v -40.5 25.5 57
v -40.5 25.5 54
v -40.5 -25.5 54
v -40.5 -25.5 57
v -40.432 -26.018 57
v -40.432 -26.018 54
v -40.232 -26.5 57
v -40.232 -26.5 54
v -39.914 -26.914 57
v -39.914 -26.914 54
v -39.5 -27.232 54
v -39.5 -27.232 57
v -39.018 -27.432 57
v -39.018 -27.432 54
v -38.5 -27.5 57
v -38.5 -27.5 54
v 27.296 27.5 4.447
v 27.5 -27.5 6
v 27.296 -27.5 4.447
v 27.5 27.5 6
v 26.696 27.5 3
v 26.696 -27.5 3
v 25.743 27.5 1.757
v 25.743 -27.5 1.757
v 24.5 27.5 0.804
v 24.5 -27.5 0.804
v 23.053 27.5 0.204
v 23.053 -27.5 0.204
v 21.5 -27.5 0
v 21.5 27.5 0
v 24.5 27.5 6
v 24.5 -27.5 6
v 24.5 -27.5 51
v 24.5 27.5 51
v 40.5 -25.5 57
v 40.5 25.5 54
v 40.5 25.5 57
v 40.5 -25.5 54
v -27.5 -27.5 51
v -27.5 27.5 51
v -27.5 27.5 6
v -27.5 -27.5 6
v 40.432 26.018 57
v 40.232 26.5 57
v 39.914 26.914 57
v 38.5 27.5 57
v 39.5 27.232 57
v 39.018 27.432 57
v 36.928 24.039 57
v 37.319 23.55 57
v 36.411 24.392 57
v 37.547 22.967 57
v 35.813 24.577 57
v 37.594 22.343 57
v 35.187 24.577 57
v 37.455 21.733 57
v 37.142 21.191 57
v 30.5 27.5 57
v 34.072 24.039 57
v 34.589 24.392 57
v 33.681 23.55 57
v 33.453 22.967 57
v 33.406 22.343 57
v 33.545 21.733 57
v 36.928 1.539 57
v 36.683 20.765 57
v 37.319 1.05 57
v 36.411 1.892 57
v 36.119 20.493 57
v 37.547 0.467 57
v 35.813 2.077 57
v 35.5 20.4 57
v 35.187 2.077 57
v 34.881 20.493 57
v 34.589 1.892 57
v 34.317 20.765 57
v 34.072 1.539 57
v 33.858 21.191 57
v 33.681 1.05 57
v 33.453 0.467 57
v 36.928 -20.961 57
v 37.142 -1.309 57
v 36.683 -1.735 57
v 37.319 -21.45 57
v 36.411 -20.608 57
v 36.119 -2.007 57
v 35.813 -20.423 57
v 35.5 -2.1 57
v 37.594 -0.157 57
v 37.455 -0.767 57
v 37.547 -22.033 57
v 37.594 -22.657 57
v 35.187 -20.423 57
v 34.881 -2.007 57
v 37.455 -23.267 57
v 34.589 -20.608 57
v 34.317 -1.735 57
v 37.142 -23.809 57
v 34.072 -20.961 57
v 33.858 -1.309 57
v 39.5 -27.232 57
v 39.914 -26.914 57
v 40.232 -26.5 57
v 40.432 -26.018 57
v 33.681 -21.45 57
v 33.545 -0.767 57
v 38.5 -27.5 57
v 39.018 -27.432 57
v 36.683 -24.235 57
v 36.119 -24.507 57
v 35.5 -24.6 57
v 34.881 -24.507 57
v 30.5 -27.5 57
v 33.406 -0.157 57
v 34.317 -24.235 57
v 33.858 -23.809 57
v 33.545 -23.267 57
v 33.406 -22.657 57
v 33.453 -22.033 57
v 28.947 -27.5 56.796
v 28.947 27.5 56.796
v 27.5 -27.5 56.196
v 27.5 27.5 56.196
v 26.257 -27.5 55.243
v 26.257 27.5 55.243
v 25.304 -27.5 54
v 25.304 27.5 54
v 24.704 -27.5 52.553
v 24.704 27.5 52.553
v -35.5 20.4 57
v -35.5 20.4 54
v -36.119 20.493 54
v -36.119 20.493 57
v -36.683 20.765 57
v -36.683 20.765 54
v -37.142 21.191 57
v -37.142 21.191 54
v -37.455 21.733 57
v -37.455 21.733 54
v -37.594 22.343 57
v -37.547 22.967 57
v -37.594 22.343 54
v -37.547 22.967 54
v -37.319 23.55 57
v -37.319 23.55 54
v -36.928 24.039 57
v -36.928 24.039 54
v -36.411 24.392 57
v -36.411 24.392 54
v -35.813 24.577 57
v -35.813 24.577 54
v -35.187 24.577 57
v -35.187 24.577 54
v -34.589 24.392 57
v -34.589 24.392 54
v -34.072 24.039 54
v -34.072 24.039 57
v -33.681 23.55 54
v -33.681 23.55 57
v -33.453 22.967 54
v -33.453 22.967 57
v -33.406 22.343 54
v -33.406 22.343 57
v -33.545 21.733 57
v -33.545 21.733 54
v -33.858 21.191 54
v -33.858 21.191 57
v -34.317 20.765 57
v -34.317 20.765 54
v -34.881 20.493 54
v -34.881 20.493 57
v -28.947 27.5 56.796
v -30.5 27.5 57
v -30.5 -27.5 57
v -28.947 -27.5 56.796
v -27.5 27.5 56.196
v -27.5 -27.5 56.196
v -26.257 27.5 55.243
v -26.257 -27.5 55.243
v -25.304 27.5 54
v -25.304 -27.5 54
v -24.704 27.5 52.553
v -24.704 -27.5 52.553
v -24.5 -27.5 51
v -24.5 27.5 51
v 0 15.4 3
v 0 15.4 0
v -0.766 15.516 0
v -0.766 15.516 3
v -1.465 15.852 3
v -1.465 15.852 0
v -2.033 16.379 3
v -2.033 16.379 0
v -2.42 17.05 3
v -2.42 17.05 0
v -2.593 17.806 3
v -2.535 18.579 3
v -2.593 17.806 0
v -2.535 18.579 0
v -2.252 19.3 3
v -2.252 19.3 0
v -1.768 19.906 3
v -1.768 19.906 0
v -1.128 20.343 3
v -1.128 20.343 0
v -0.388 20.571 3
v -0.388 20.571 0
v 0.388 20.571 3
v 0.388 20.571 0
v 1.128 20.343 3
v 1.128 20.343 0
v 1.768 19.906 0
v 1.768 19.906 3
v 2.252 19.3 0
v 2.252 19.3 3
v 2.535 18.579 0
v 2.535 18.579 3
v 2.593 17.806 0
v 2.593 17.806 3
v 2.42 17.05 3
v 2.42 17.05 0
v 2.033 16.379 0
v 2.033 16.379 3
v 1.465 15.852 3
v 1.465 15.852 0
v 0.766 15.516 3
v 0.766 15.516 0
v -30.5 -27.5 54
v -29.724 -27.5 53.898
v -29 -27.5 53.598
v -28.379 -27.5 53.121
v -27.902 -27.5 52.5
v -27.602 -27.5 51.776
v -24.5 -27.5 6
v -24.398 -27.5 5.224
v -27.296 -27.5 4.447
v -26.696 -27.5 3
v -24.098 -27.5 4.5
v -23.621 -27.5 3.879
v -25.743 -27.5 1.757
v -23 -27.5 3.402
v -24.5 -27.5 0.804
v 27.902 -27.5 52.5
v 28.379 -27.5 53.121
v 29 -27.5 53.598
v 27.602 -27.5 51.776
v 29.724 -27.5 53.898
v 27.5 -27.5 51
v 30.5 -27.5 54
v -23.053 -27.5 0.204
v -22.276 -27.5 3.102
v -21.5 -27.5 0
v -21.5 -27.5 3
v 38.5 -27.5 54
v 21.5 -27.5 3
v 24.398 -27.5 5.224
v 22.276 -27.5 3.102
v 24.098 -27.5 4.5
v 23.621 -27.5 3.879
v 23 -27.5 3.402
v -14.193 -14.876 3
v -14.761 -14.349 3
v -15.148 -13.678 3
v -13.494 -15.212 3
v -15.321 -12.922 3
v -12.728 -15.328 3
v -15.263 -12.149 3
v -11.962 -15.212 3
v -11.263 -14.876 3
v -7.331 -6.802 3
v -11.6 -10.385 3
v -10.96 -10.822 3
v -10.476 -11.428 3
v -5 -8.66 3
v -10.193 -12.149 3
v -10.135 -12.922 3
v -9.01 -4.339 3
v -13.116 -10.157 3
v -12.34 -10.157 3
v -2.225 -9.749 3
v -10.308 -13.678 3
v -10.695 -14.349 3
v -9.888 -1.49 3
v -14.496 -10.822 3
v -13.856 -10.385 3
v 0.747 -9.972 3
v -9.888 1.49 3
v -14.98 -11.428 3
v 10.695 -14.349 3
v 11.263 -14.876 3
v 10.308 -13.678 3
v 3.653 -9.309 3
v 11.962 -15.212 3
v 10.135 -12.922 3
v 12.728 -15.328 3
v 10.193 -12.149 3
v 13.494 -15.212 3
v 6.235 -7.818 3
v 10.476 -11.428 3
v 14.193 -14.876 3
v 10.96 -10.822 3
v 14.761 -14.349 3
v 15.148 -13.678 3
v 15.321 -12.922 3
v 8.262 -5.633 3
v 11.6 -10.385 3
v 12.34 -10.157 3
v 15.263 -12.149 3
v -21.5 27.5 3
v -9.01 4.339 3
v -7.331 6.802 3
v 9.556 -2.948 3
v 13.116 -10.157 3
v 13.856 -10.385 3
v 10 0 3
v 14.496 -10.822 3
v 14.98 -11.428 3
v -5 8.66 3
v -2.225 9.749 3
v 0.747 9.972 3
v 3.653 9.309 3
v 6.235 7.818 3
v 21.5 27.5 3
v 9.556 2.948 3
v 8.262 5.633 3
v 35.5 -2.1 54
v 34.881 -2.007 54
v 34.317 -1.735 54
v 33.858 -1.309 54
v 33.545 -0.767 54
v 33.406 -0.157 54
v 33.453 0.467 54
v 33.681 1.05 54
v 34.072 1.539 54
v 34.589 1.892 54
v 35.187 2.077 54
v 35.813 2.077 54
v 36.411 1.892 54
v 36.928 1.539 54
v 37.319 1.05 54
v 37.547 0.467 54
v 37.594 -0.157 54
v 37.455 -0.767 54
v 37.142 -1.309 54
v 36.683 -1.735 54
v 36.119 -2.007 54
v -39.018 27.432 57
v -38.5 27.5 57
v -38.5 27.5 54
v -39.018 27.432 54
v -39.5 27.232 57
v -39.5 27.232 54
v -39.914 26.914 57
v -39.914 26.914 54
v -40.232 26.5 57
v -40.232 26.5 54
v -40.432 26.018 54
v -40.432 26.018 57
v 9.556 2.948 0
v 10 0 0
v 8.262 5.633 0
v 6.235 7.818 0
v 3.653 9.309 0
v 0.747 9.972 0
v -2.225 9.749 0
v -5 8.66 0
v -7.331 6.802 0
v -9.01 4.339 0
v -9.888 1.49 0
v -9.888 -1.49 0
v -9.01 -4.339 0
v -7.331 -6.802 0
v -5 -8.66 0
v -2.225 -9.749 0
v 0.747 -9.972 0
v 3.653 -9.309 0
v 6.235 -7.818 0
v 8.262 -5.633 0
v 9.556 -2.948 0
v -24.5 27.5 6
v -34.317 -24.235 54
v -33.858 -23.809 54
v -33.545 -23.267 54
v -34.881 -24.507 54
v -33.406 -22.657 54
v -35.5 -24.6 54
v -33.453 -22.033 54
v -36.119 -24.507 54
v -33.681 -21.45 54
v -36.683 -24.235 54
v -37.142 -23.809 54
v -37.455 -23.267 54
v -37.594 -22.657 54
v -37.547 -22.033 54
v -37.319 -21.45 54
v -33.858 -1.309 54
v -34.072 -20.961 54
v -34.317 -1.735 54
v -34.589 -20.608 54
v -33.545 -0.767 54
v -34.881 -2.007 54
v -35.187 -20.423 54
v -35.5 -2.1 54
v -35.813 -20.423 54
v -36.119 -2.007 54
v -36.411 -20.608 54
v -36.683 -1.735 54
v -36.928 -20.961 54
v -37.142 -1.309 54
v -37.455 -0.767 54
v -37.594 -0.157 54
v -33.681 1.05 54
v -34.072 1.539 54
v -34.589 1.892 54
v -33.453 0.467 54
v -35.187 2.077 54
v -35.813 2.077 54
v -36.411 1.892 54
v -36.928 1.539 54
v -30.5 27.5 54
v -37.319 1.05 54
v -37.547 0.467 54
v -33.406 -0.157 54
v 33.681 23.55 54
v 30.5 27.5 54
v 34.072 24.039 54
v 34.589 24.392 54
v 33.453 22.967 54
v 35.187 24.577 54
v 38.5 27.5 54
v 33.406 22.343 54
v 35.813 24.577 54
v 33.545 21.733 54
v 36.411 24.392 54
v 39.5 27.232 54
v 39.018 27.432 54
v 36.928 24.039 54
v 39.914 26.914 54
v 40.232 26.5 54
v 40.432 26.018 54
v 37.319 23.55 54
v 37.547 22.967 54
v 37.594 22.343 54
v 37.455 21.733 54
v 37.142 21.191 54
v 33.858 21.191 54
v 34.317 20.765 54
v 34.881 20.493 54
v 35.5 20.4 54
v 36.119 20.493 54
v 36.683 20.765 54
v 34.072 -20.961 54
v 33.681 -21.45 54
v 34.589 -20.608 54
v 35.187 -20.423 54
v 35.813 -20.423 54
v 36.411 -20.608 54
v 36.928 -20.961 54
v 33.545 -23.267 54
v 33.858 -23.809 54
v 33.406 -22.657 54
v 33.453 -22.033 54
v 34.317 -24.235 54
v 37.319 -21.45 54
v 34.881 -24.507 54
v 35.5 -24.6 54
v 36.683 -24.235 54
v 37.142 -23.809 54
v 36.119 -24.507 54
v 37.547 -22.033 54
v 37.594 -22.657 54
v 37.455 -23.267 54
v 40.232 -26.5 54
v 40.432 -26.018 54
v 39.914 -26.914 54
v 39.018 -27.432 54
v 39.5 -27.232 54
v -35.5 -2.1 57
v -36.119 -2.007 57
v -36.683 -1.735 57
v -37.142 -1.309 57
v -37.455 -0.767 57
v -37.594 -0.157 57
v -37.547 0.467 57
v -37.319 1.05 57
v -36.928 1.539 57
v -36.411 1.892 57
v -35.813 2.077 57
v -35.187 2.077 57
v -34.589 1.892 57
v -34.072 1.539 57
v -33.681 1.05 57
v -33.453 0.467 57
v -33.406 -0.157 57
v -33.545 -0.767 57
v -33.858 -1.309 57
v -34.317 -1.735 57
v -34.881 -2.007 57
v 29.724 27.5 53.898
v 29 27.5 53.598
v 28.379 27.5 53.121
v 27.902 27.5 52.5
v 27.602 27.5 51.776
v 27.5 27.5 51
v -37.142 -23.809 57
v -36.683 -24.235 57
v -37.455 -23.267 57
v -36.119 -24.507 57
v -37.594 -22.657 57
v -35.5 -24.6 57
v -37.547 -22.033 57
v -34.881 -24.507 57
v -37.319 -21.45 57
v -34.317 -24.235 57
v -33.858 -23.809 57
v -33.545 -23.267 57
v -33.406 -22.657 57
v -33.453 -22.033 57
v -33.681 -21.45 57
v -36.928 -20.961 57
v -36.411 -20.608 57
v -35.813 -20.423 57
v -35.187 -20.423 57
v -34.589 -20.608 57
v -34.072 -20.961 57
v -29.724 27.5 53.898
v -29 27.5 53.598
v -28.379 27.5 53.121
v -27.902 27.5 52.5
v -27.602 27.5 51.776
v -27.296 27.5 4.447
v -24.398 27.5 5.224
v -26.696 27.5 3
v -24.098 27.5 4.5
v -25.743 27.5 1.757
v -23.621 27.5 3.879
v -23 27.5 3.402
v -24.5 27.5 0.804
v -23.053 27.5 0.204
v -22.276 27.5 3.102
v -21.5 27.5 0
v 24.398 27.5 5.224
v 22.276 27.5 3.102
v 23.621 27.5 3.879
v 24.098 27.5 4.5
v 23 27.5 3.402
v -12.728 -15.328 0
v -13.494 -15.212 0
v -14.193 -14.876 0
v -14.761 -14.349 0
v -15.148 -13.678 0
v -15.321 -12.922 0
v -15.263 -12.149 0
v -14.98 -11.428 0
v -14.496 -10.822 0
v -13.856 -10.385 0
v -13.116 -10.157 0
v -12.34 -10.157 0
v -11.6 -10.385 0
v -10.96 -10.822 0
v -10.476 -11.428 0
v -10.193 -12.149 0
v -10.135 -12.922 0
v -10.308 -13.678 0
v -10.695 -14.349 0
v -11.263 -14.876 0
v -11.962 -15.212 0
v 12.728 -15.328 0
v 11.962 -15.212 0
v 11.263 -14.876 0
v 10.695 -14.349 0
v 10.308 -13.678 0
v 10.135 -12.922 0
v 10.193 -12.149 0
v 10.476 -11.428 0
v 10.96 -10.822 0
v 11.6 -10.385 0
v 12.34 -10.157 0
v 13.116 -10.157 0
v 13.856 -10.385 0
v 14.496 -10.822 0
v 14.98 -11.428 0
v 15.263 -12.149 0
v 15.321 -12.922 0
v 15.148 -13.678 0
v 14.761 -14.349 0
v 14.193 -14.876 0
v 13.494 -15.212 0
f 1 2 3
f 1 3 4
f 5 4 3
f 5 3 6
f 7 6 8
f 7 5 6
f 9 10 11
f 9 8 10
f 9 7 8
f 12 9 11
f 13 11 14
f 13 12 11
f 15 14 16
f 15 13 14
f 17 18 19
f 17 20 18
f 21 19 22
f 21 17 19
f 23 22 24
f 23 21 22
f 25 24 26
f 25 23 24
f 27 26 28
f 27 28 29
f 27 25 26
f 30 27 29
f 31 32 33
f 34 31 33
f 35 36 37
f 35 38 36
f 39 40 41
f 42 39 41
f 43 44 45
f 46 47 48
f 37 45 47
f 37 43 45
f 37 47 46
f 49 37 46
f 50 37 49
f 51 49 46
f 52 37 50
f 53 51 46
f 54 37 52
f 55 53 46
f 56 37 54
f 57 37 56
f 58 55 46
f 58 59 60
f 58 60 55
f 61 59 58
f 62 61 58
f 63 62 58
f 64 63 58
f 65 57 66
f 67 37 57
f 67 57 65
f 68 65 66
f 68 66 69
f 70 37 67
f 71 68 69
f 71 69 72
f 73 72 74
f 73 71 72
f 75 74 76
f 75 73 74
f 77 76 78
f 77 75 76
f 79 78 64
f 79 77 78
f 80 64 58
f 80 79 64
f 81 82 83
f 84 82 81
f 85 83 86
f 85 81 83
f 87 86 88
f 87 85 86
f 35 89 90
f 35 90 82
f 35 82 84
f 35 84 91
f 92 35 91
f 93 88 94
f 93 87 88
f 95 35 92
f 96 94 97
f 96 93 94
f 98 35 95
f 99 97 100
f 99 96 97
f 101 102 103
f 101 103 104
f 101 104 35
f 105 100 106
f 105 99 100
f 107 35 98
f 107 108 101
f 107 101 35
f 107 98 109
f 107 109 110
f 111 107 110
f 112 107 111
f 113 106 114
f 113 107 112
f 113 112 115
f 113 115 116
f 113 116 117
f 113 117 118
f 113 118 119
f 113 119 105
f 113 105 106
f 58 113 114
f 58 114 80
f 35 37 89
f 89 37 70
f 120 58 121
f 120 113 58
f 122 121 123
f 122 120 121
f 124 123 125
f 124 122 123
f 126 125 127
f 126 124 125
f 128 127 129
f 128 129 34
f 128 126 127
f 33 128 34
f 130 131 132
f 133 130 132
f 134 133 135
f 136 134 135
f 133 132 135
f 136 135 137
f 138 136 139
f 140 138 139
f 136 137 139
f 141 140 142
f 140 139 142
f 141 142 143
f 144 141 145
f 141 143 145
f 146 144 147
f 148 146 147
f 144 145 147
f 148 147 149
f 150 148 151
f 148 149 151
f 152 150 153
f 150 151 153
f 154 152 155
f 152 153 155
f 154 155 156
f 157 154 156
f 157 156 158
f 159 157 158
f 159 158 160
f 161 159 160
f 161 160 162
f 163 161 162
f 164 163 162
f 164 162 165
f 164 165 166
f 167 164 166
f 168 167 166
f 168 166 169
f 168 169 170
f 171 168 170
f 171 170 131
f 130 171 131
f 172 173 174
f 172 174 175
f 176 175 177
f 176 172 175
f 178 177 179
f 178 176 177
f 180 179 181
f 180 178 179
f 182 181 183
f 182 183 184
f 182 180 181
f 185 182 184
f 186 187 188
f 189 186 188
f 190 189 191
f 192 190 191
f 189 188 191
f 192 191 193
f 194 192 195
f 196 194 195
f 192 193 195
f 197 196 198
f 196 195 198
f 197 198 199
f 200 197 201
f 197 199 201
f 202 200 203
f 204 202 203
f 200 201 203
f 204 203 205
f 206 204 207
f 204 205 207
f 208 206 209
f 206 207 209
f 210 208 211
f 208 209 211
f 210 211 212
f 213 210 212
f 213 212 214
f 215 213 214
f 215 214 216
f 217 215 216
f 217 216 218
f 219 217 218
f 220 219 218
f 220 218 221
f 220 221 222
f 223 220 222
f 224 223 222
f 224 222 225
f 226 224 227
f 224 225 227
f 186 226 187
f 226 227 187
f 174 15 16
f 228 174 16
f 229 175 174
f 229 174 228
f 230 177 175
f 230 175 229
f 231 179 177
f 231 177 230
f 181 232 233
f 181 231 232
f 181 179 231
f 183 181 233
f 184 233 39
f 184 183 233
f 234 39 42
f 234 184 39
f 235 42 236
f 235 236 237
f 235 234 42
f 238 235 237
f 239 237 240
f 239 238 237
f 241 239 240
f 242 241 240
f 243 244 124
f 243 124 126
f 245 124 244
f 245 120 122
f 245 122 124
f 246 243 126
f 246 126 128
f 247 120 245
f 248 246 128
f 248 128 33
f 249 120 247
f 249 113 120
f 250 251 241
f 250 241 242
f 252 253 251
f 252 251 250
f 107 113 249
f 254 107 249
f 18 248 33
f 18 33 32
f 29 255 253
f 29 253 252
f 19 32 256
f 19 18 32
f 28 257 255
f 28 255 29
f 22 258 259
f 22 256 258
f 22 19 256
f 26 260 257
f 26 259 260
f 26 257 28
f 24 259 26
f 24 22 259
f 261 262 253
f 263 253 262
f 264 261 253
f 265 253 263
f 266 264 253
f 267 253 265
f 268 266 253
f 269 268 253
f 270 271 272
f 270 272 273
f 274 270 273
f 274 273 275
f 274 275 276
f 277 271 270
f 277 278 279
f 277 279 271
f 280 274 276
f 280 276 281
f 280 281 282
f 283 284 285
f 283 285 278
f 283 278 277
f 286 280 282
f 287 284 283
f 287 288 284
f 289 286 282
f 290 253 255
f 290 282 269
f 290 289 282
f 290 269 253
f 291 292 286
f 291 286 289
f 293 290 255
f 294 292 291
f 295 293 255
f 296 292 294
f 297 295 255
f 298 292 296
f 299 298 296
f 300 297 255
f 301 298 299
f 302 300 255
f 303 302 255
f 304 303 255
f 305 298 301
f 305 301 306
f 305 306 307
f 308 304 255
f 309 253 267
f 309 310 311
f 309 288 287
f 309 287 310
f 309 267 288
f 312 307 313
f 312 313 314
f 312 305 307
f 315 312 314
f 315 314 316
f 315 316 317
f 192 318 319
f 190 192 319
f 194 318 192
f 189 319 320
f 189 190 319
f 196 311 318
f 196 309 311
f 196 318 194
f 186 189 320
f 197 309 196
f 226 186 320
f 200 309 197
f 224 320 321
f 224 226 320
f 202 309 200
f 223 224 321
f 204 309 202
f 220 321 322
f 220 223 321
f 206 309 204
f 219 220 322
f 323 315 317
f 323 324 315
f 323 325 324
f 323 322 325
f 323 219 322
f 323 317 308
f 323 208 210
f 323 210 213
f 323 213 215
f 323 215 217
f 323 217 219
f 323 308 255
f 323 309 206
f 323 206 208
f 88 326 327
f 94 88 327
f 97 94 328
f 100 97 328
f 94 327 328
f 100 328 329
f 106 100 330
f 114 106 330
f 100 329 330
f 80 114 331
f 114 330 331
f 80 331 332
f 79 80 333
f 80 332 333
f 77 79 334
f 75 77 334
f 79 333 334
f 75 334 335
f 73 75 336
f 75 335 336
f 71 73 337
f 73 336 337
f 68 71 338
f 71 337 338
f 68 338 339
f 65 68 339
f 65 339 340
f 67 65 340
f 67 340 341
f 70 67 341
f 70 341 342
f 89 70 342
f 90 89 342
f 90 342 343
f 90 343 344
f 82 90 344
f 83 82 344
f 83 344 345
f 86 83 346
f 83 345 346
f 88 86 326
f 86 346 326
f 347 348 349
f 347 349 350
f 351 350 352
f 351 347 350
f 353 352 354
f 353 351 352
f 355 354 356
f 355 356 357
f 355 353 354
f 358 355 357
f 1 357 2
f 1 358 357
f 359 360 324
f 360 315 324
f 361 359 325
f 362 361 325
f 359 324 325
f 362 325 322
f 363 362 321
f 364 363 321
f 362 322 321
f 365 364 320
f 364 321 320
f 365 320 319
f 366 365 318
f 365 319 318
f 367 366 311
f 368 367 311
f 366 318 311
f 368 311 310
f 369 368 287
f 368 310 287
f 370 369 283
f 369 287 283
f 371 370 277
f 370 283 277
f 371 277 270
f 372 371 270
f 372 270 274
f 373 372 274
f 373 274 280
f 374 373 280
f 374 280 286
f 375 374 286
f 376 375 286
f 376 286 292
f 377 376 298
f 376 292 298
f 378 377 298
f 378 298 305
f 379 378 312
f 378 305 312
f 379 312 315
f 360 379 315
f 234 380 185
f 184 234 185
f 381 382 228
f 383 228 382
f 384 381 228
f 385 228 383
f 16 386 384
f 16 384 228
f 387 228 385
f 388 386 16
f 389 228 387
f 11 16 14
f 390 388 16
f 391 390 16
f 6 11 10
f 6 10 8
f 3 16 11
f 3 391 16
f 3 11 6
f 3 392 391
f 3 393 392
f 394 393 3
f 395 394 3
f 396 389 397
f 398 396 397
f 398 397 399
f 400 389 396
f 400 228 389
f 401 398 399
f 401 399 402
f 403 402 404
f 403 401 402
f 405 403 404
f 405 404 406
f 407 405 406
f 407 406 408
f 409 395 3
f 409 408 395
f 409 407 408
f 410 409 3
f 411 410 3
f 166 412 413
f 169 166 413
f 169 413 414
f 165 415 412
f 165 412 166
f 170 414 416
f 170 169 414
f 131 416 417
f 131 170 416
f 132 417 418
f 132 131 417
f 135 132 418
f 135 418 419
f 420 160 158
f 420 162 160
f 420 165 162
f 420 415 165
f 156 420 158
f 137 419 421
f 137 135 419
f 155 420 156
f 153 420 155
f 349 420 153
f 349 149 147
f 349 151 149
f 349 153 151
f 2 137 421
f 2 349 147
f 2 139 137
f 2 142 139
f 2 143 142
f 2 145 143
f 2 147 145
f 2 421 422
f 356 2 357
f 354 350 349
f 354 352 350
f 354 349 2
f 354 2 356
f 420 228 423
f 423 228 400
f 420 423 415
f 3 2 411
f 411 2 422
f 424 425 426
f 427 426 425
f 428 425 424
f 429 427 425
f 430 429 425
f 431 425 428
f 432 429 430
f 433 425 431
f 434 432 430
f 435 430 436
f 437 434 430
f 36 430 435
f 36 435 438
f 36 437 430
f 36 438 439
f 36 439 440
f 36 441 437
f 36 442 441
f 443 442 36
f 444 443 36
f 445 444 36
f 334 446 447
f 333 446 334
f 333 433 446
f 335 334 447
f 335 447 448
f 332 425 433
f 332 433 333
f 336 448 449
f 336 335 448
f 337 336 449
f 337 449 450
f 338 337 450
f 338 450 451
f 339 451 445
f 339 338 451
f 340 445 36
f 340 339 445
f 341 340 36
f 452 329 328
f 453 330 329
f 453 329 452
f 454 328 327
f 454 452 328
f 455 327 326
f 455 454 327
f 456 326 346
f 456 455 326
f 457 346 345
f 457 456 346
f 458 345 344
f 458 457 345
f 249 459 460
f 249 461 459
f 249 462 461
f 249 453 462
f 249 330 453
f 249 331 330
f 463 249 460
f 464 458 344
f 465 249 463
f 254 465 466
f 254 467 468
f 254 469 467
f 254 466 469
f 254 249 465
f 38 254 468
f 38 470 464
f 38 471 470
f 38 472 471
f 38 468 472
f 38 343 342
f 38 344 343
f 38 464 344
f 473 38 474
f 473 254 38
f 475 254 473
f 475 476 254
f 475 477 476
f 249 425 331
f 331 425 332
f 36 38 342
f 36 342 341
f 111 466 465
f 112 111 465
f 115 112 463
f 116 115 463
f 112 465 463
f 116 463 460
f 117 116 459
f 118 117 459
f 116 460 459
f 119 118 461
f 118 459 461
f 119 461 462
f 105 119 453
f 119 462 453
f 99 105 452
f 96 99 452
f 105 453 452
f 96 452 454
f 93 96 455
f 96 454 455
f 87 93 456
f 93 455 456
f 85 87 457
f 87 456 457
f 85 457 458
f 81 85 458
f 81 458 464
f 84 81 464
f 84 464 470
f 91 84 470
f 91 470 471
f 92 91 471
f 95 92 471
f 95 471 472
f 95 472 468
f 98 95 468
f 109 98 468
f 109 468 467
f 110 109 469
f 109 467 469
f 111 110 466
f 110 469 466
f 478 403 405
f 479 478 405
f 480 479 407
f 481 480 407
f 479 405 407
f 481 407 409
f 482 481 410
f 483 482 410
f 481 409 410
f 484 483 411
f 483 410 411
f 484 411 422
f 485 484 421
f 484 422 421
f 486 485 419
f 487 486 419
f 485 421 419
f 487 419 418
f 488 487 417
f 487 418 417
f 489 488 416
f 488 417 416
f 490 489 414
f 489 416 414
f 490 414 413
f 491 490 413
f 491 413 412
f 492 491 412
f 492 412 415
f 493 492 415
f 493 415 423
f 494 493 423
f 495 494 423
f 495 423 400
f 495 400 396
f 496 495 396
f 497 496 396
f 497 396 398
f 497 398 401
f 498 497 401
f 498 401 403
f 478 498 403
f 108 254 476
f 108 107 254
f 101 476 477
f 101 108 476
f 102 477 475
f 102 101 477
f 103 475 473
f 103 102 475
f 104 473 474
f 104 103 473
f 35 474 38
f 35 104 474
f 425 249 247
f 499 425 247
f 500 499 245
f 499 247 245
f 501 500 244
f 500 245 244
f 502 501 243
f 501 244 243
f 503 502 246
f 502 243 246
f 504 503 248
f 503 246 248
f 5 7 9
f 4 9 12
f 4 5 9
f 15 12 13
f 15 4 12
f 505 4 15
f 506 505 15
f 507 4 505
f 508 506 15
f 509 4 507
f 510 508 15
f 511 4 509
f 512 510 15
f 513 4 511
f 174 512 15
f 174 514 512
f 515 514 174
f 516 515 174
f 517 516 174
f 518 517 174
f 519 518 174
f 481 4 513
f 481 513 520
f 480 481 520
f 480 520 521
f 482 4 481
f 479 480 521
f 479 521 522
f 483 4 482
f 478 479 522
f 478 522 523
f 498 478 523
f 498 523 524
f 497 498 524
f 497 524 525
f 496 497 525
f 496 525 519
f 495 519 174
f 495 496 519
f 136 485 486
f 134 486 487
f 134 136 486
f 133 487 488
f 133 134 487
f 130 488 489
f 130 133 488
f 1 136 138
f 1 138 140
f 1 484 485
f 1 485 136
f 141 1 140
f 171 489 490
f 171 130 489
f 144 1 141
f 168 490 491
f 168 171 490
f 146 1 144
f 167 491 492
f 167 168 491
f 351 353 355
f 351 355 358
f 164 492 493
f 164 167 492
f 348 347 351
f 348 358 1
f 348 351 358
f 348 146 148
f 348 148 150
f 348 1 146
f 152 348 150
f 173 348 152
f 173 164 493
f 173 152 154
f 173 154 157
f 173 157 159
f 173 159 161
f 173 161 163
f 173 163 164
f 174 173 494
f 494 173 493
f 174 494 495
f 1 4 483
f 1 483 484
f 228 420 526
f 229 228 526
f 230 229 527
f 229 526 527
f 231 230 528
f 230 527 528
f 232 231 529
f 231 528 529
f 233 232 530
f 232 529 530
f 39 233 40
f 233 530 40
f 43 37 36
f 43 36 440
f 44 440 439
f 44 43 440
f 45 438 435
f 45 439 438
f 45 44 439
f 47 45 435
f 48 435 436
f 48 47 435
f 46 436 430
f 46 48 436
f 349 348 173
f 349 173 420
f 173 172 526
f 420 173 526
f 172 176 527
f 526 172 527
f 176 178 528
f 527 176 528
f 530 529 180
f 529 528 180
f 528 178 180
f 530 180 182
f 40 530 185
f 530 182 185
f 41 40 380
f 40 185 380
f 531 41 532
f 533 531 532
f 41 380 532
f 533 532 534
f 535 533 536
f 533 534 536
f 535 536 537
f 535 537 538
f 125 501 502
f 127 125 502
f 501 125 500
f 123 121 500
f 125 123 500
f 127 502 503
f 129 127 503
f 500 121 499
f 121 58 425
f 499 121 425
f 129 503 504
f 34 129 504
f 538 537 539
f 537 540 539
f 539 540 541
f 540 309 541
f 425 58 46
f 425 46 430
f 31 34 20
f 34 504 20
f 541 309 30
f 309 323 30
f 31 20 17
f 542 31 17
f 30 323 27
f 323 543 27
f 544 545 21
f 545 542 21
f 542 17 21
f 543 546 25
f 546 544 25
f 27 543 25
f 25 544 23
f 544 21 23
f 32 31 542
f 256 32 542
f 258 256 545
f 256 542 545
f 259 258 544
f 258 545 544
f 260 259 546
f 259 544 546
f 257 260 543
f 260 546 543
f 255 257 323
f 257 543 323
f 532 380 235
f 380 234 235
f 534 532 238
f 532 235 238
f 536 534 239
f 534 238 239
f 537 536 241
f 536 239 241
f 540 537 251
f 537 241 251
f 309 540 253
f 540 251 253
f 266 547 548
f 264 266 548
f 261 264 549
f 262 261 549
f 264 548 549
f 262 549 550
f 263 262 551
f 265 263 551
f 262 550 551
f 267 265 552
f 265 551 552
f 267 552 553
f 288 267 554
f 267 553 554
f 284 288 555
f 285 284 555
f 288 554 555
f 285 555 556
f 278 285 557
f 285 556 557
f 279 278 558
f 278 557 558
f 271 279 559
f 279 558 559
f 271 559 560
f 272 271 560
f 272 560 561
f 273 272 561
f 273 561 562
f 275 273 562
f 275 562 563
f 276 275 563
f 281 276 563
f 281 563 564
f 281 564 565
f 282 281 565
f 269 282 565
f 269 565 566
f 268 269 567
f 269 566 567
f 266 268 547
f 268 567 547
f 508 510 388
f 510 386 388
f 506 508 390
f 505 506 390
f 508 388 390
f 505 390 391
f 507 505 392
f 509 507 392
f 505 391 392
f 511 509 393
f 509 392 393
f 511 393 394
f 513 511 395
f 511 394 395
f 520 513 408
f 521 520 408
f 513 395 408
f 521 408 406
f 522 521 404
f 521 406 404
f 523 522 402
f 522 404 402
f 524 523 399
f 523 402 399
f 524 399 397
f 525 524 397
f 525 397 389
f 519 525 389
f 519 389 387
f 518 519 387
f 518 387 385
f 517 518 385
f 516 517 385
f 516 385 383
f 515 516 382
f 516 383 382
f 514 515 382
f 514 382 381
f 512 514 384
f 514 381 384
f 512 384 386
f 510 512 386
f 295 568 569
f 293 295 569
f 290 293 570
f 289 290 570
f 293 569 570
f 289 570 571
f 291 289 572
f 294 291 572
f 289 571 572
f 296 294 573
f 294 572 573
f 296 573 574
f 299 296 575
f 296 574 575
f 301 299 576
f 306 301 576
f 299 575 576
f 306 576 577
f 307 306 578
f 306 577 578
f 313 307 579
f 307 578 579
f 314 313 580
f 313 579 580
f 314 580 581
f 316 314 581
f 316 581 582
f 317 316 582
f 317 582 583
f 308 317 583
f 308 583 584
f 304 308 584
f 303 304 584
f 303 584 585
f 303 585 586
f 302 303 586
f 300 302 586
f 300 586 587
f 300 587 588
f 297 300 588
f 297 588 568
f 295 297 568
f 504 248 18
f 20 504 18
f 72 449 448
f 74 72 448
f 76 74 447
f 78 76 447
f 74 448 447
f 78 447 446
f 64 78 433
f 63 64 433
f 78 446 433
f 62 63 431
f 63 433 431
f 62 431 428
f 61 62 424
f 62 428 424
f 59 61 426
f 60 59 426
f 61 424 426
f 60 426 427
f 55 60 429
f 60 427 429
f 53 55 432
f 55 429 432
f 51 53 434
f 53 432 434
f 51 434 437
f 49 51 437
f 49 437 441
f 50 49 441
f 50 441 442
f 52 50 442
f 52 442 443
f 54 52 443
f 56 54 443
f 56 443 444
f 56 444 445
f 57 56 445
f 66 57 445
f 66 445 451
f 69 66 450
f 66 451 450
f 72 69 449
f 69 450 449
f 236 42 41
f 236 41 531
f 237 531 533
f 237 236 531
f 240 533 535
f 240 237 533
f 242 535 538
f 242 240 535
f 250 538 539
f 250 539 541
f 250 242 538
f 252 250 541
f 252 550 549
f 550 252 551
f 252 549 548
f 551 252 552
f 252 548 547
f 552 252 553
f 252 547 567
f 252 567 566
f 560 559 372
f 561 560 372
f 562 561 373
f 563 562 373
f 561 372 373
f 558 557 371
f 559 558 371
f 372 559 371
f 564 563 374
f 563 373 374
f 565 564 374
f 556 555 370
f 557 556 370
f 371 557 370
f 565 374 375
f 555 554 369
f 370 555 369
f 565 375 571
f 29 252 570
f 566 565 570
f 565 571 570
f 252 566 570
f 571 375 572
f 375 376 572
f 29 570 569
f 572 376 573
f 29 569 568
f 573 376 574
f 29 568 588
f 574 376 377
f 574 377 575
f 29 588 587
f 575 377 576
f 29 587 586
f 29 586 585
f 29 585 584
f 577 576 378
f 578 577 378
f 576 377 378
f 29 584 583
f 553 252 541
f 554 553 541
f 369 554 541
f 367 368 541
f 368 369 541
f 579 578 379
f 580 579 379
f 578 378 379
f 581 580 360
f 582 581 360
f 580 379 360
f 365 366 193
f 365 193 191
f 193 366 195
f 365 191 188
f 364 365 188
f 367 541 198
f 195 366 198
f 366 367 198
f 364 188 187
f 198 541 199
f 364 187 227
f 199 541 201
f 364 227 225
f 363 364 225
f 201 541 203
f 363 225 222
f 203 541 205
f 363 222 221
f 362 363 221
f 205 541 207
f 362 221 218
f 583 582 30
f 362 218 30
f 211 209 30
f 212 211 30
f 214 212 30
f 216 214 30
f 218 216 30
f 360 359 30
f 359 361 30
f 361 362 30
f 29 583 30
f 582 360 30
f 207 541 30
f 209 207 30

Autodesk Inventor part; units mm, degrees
ref_plane "YZ Plane" through (0, 0, 0) normal (1, 0, 0) x (0, 1, 0)
ref_plane "XZ Plane" through (0, 0, 0) normal (0, 1, 0) x (-1, 0, 0)
ref_plane "XY Plane" through (0, 0, 0) normal (0, 0, 1) x (1, 0, 0)
sketch "スケッチ1" plane through (0, 0, 0) normal (0, 0, 1) x (1, 0, 0)
  line L0 (27.5, -27.5) -> (-27.5, -27.5)
  line L1 (-27.5, -27.5) -> (-27.5, 27.5)
  line L2 (-27.5, 27.5) -> (27.5, 27.5)
  line L3 (27.5, 27.5) -> (27.5, -27.5)
  line L4 (27.5, -27.5) -> (-27.5, 27.5) construction
  line L5 (-27.5, -27.5) -> (27.5, 27.5) construction
  point P0 (0, 0)
  dimension "d0" = 55
  dimension "d1" = 55
extrude "プレート1" add sketch "スケッチ1" along normal blind 3
sketch "スケッチ2" plane through (0, 0, 3) normal (0, 0, 1) x (1, 0, 0)
  line L0 (-27.5, -27.5) -> (-27.5, 27.5) projected
  line L1 (27.5, -27.5) -> (-27.5, -27.5) projected
  line L2 (27.5, 27.5) -> (27.5, -27.5) projected
  line L3 (-27.5, 27.5) -> (27.5, 27.5) projected
  circle A0 centre (0, 0) radius 18
  point P0 (0, 18)
  point P1 (-18, 0)
  point P2 (0, -18)
  point P3 (18, 0)
  point P4 (-12.728, -12.7278)
  point P5 (12.728, -12.7278)
  dimension "d3" = 36
  dimension "d54" = 25.456
hole "穴1" at (0, 18, 3) at (12.728, -12.7278, 3) at (-12.728, -12.7278, 3) direction (0, 0, -1) diameter 5.2 end through all
sketch "スケッチ3" plane through (0, 0, 3) normal (0, 0, 1) x (1, 0, 0)
  circle A0 centre (0, 0) radius 10
  dimension "d15" = 20
extrude "押し出し1" cut sketch "スケッチ3" against normal blind 10
sketch "スケッチ4" plane through (-24.5, -27.5, 0) normal (-1, 0, 0) x (0, -1, 0)
  line L0 (-55, 0) -> (0, 0)
  line L1 (0, 0) -> (0, 57)
  line L2 (0, 57) -> (-55, 57)
  line L3 (-55, 57) -> (-55, 0)
edge flange "フランジ1" height 57 angle 90 thickness 3 bend radius 3 thickness toward (-1, 0, 0) relief tear relief width 3 relief depth 1.5 corner gap 3 corner form 0 edges at (-27.5, 0, 3) (27.5, 0, 3) wall of the first edge with corners at (-24.5, 27.5, 0) (-24.5, -27.5, 0) (-24.5, -27.5, 57) (-24.5, 27.5, 57)
bend "曲げ1"
corner "コーナー1"
sketch "スケッチ5" plane through (24.5, -27.5, 54) normal (0, 0, 1) x (1, 0, 0)
  line L0 (0, 55) -> (0, 0)
  line L1 (0, 0) -> (16, 0)
  line L2 (16, 0) -> (16, 55)
  line L3 (16, 55) -> (0, 55)
edge flange "フランジ2" height 16 angle 90 thickness 3 bend radius 3 thickness toward (0, 0, 1) relief tear relief width 3 relief depth 1.5 corner gap 3 corner form 0 edges at (27.5, 0, 57) (-27.5, 0, 57) wall of the first edge with corners at (24.5, 27.5, 54) (24.5, -27.5, 54) (40.5, -27.5, 54) (40.5, 27.5, 54)
bend "曲げ2"
corner "コーナー2"
fillet "フィレット1" radius 2 4 edges at (40.5, 27.5, 55.5) (40.5, -27.5, 55.5) (-40.5, -27.5, 55.5) (-40.5, 27.5, 55.5)
sketch "スケッチ8" plane through (-30.5, -27.5, 57) normal (0, 0, 1) x (1, 0, 0)
  arc A0 (-8, 55) -> (-10, 53) centre (-8, 53) ccw projected
  line L0 (-10, 2) -> (-10, 53) projected
  arc A1 (-10, 2) -> (-8, 0) centre (-8, 2) ccw projected
  line L1 (0, 0) -> (-8, 0) projected
  line L2 (0, 0) -> (0, 55) projected
  line L3 (-8, 55) -> (0, 55) projected
  arc A2 (69, 0) -> (71, 2) centre (69, 2) ccw projected
  line L4 (71, 53) -> (71, 2) projected
  arc A3 (71, 53) -> (69, 55) centre (69, 53) ccw projected
  line L5 (61, 55) -> (69, 55) projected
  line L6 (61, 55) -> (61, 0) projected
  line L7 (69, 0) -> (61, 0) projected
  line L8 (-5, 50) -> (66, 50)
  line L9 (66, 50) -> (66, 5)
  line L10 (66, 5) -> (-5, 5)
  line L11 (-5, 5) -> (-5, 50)
  point P0 (30.5, 27.5)
  point P1 (-5, 27.5)
  point P2 (66, 27.5)
  dimension "d55" = 5
  dimension "d56" = 5
  dimension "d57" = 5
  dimension "d58" = 5
hole "穴3" at (-35.5, 0, 57) at (35.5, 0, 57) at (-35.5, -22.5, 57) at (-35.5, 22.5, 57) at (35.5, -22.5, 57) at (35.5, 22.5, 57) direction (0, 0, -1) diameter 4.2 end through all
equation "\"d13\" = Thickness"
equation "\"d64\" = Thickness"
equation "\"d2\" = Thickness"
equation "\"d18\" = BendReliefWidth"
equation "\"d19\" = BendReliefDepth"
equation "\"d20\" = MinimumRemnant"
equation "\"d21\" = TransitionRadius"
equation "\"d24\" = BendRadius"
equation "\"d25\" = CornerReliefSize"
equation "\"d26\" = GapSize"
equation "\"d27\" = JacobiRadiusSize"
equation "\"d28\" = BendReliefWidth"
equation "\"d29\" = BendReliefDepth"
equation "\"d30\" = MinimumRemnant"
equation "\"d31\" = TransitionRadius"
equation "\"d34\" = BendRadius"
equation "\"d35\" = CornerReliefSize"
equation "\"d36\" = GapSize"
equation "\"d37\" = JacobiRadiusSize"
equation "\"BendRadius\" = Thickness"
equation "\"BendReliefWidth\" = Thickness"
equation "\"BendReliefDepth\" = 0.5 * Thickness"
equation "\"CornerReliefSize\" = 4 * Thickness"
equation "\"MinimumRemnant\" = 2 * Thickness"
equation "\"TransitionRadius\" = BendRadius"
equation "\"JacobiRadiusSize\" = BendRadius"
equation "\"GapSize\" = Thickness"
equation "\"Thickness\" = 3"
properties part number "CCM_Motor_Mount_A"
